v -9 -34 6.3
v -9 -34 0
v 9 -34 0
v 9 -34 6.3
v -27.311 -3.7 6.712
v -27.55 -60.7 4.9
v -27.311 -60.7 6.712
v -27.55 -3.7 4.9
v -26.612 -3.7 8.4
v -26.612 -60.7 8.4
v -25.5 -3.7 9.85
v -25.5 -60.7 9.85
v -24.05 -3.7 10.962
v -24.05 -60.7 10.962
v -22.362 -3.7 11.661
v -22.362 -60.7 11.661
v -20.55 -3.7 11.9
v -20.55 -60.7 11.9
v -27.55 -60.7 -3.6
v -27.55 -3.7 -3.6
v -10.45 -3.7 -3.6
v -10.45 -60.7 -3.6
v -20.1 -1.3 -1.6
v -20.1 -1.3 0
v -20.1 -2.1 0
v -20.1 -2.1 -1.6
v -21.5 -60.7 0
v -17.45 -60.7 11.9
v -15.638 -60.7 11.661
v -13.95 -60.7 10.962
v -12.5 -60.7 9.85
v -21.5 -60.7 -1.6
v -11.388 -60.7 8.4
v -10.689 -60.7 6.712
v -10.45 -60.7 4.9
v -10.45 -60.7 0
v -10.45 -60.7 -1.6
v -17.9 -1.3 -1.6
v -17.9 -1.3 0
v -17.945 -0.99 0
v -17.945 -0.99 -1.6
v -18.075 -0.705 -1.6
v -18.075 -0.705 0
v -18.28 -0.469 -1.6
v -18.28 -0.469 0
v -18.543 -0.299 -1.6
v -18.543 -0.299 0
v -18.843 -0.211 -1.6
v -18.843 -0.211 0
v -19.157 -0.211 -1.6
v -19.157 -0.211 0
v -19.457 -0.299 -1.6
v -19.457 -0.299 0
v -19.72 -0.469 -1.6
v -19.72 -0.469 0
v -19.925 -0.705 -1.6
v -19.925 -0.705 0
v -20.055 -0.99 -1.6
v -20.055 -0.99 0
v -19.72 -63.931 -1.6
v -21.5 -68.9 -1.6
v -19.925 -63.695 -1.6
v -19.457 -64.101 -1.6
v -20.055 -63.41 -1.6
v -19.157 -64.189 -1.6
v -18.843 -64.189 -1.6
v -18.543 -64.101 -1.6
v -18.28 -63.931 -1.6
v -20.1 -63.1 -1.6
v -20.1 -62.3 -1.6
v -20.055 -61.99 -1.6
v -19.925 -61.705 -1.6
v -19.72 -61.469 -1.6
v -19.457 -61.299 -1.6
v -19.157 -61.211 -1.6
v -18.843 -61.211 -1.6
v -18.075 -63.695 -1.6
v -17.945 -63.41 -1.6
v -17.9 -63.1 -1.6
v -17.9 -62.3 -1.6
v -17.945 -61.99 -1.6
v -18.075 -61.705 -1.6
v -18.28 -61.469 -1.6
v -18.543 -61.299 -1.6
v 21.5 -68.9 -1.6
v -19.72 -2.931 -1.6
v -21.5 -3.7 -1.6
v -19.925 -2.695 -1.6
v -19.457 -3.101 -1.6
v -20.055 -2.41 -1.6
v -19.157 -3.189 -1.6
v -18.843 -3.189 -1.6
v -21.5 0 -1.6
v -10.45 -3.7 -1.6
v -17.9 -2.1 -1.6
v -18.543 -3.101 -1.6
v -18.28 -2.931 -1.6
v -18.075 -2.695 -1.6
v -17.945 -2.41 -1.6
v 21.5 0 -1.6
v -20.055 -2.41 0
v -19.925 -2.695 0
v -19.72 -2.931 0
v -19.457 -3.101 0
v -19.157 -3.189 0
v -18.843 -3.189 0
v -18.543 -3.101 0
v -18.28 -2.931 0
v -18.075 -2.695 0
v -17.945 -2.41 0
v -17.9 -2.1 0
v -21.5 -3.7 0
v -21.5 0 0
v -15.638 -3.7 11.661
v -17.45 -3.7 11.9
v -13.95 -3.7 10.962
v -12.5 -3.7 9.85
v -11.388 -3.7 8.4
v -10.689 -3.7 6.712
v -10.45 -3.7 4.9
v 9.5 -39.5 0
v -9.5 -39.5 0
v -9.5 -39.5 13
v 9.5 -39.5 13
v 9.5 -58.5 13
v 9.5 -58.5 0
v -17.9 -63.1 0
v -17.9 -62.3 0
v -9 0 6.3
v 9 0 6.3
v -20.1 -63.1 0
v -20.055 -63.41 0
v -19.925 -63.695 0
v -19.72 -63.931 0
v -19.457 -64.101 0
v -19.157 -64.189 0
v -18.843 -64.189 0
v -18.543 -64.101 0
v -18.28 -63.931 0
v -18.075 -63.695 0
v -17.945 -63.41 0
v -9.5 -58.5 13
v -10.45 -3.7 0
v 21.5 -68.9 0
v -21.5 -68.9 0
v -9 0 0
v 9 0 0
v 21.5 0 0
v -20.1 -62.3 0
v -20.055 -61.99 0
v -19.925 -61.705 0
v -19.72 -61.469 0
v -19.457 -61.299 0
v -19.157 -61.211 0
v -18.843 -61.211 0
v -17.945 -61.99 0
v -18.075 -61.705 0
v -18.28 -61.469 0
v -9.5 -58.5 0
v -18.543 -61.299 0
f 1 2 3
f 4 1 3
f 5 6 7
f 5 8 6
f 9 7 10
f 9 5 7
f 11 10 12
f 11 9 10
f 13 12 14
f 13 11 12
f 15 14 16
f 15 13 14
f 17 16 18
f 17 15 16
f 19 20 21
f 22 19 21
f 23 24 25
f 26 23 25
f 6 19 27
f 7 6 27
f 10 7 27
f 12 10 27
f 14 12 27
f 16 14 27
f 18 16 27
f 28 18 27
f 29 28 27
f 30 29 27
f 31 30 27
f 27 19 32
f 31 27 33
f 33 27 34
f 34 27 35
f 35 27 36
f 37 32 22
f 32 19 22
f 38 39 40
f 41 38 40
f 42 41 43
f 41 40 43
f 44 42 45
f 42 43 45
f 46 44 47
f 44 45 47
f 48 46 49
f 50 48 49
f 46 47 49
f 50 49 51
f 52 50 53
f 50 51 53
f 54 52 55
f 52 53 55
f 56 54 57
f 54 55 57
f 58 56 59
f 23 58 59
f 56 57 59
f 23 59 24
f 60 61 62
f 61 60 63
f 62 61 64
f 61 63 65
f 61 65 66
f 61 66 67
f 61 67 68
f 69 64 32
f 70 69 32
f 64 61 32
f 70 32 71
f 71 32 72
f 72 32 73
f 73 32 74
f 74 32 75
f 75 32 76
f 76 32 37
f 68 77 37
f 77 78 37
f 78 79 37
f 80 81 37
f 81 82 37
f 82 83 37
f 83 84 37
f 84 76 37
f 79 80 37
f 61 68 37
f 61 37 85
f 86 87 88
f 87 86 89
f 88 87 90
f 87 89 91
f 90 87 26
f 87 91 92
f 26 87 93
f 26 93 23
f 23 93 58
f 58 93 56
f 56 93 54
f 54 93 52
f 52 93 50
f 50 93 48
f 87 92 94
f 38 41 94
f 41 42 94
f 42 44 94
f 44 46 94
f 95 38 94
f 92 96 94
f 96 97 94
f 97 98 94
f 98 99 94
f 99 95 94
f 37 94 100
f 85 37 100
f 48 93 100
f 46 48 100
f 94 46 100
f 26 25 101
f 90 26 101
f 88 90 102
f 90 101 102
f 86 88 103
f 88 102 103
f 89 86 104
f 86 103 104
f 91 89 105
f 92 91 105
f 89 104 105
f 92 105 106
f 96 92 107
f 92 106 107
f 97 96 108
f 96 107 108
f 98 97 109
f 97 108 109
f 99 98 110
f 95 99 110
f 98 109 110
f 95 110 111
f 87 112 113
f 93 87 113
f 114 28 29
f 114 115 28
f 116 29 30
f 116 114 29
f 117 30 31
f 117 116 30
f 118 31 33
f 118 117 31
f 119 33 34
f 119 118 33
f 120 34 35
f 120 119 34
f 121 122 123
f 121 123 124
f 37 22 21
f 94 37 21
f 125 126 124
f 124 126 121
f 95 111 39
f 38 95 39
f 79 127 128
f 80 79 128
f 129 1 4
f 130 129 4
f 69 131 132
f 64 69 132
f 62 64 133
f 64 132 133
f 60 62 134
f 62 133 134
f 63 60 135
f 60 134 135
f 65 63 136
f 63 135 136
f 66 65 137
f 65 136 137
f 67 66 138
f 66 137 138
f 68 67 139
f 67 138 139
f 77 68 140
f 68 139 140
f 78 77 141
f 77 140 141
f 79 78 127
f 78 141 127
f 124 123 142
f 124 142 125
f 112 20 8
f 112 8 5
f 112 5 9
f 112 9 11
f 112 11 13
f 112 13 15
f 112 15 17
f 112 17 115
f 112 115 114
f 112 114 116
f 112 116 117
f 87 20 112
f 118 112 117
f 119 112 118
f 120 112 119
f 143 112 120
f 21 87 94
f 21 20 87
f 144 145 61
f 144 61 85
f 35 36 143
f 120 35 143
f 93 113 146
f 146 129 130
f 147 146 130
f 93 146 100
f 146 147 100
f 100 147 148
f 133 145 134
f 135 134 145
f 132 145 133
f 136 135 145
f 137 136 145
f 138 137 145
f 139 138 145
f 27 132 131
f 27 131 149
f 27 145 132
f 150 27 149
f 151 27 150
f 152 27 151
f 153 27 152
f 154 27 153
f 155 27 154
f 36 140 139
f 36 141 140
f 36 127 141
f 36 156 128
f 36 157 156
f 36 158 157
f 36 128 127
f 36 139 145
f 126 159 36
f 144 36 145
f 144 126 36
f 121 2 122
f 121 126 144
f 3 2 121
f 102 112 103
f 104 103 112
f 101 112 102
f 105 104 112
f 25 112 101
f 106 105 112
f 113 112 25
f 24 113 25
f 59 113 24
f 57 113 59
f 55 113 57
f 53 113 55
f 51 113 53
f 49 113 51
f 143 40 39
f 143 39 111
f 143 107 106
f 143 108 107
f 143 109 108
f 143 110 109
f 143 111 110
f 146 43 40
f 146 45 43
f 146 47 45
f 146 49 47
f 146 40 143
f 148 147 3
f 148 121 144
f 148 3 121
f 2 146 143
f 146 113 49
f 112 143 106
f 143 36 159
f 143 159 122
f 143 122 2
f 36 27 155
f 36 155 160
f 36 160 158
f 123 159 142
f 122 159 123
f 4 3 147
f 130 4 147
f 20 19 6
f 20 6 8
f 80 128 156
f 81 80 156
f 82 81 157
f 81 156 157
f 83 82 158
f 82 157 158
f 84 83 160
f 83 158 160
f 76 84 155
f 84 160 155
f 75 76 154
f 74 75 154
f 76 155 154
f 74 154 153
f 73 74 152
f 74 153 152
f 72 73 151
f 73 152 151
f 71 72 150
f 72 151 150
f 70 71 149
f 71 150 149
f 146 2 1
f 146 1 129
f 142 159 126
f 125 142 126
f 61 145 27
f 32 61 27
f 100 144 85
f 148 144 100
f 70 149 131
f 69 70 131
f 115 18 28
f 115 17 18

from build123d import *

# Parameters (mm, degrees)
SKETCH004_W     = 43
SKETCH004_H     = 68.9
PAD001_DEPTH    = 1.6
SKETCH005_W     = 18
SKETCH005_H     = 34
PAD002_DEPTH    = 6.3
SKETCH006_W     = 17.1
SKETCH006_H     = 57
PAD003_DEPTH    = 15.5
FILLET_R        = 7
POCKET003_DEPTH = 3.601
SKETCH010_W     = 19
SKETCH010_H     = 19
PAD004_DEPTH    = 13


with BuildPart() as part:
    # Sketch004 → Pad001 (new body)
    with BuildSketch(Plane.XY):
        with Locations((0, -34.45)):
            Rectangle(SKETCH004_W, SKETCH004_H)
    extrude(amount=-PAD001_DEPTH)

    # Sketch005 → Pad002 (join)
    with BuildSketch(Plane.XY):
        with Locations((0, -17)):
            Rectangle(SKETCH005_W, SKETCH005_H)
    extrude(amount=PAD002_DEPTH)

    # Sketch006 → Pad003 (join)
    with BuildSketch(Plane.XY.offset(-3.6)):
        with Locations((-19, -32.2)):
            Rectangle(SKETCH006_W, SKETCH006_H)
    extrude(amount=PAD003_DEPTH)

    # Fillet
    fillet_edges = [part.edges().sort_by_distance(p)[0] for p in [
        (-10.45, -32.2, 11.9),
        (-27.55, -32.2, 11.9),
    ]]
    fillet(fillet_edges, radius=FILLET_R)

    # Sketch009 → Pocket003 (cut, through all)
    with BuildSketch(Plane.XY):
        with BuildLine():
            ThreePointArc((-20.1, -63.1), (-19, -64.2), (-17.9, -63.1))
            Line((-17.9, -63.1), (-17.9, -62.3))
            ThreePointArc((-17.9, -62.3), (-19, -61.2), (-20.1, -62.3))
            Line((-20.1, -62.3), (-20.1, -63.1))
        make_face()
        with BuildLine():
            ThreePointArc((-17.9, -1.3), (-19, -0.2), (-20.1, -1.3))
            Line((-20.1, -1.3), (-20.1, -2.1))
            ThreePointArc((-20.1, -2.1), (-19, -3.2), (-17.9, -2.1))
            Line((-17.9, -2.1), (-17.9, -1.3))
        make_face()
    extrude(amount=-POCKET003_DEPTH, mode=Mode.SUBTRACT)

    # Sketch010 → Pad004 (join)
    with BuildSketch(Plane.XY):
        with Locations((0, -49)):
            Rectangle(SKETCH010_W, SKETCH010_H)
    extrude(amount=PAD004_DEPTH)


solid = part.part
